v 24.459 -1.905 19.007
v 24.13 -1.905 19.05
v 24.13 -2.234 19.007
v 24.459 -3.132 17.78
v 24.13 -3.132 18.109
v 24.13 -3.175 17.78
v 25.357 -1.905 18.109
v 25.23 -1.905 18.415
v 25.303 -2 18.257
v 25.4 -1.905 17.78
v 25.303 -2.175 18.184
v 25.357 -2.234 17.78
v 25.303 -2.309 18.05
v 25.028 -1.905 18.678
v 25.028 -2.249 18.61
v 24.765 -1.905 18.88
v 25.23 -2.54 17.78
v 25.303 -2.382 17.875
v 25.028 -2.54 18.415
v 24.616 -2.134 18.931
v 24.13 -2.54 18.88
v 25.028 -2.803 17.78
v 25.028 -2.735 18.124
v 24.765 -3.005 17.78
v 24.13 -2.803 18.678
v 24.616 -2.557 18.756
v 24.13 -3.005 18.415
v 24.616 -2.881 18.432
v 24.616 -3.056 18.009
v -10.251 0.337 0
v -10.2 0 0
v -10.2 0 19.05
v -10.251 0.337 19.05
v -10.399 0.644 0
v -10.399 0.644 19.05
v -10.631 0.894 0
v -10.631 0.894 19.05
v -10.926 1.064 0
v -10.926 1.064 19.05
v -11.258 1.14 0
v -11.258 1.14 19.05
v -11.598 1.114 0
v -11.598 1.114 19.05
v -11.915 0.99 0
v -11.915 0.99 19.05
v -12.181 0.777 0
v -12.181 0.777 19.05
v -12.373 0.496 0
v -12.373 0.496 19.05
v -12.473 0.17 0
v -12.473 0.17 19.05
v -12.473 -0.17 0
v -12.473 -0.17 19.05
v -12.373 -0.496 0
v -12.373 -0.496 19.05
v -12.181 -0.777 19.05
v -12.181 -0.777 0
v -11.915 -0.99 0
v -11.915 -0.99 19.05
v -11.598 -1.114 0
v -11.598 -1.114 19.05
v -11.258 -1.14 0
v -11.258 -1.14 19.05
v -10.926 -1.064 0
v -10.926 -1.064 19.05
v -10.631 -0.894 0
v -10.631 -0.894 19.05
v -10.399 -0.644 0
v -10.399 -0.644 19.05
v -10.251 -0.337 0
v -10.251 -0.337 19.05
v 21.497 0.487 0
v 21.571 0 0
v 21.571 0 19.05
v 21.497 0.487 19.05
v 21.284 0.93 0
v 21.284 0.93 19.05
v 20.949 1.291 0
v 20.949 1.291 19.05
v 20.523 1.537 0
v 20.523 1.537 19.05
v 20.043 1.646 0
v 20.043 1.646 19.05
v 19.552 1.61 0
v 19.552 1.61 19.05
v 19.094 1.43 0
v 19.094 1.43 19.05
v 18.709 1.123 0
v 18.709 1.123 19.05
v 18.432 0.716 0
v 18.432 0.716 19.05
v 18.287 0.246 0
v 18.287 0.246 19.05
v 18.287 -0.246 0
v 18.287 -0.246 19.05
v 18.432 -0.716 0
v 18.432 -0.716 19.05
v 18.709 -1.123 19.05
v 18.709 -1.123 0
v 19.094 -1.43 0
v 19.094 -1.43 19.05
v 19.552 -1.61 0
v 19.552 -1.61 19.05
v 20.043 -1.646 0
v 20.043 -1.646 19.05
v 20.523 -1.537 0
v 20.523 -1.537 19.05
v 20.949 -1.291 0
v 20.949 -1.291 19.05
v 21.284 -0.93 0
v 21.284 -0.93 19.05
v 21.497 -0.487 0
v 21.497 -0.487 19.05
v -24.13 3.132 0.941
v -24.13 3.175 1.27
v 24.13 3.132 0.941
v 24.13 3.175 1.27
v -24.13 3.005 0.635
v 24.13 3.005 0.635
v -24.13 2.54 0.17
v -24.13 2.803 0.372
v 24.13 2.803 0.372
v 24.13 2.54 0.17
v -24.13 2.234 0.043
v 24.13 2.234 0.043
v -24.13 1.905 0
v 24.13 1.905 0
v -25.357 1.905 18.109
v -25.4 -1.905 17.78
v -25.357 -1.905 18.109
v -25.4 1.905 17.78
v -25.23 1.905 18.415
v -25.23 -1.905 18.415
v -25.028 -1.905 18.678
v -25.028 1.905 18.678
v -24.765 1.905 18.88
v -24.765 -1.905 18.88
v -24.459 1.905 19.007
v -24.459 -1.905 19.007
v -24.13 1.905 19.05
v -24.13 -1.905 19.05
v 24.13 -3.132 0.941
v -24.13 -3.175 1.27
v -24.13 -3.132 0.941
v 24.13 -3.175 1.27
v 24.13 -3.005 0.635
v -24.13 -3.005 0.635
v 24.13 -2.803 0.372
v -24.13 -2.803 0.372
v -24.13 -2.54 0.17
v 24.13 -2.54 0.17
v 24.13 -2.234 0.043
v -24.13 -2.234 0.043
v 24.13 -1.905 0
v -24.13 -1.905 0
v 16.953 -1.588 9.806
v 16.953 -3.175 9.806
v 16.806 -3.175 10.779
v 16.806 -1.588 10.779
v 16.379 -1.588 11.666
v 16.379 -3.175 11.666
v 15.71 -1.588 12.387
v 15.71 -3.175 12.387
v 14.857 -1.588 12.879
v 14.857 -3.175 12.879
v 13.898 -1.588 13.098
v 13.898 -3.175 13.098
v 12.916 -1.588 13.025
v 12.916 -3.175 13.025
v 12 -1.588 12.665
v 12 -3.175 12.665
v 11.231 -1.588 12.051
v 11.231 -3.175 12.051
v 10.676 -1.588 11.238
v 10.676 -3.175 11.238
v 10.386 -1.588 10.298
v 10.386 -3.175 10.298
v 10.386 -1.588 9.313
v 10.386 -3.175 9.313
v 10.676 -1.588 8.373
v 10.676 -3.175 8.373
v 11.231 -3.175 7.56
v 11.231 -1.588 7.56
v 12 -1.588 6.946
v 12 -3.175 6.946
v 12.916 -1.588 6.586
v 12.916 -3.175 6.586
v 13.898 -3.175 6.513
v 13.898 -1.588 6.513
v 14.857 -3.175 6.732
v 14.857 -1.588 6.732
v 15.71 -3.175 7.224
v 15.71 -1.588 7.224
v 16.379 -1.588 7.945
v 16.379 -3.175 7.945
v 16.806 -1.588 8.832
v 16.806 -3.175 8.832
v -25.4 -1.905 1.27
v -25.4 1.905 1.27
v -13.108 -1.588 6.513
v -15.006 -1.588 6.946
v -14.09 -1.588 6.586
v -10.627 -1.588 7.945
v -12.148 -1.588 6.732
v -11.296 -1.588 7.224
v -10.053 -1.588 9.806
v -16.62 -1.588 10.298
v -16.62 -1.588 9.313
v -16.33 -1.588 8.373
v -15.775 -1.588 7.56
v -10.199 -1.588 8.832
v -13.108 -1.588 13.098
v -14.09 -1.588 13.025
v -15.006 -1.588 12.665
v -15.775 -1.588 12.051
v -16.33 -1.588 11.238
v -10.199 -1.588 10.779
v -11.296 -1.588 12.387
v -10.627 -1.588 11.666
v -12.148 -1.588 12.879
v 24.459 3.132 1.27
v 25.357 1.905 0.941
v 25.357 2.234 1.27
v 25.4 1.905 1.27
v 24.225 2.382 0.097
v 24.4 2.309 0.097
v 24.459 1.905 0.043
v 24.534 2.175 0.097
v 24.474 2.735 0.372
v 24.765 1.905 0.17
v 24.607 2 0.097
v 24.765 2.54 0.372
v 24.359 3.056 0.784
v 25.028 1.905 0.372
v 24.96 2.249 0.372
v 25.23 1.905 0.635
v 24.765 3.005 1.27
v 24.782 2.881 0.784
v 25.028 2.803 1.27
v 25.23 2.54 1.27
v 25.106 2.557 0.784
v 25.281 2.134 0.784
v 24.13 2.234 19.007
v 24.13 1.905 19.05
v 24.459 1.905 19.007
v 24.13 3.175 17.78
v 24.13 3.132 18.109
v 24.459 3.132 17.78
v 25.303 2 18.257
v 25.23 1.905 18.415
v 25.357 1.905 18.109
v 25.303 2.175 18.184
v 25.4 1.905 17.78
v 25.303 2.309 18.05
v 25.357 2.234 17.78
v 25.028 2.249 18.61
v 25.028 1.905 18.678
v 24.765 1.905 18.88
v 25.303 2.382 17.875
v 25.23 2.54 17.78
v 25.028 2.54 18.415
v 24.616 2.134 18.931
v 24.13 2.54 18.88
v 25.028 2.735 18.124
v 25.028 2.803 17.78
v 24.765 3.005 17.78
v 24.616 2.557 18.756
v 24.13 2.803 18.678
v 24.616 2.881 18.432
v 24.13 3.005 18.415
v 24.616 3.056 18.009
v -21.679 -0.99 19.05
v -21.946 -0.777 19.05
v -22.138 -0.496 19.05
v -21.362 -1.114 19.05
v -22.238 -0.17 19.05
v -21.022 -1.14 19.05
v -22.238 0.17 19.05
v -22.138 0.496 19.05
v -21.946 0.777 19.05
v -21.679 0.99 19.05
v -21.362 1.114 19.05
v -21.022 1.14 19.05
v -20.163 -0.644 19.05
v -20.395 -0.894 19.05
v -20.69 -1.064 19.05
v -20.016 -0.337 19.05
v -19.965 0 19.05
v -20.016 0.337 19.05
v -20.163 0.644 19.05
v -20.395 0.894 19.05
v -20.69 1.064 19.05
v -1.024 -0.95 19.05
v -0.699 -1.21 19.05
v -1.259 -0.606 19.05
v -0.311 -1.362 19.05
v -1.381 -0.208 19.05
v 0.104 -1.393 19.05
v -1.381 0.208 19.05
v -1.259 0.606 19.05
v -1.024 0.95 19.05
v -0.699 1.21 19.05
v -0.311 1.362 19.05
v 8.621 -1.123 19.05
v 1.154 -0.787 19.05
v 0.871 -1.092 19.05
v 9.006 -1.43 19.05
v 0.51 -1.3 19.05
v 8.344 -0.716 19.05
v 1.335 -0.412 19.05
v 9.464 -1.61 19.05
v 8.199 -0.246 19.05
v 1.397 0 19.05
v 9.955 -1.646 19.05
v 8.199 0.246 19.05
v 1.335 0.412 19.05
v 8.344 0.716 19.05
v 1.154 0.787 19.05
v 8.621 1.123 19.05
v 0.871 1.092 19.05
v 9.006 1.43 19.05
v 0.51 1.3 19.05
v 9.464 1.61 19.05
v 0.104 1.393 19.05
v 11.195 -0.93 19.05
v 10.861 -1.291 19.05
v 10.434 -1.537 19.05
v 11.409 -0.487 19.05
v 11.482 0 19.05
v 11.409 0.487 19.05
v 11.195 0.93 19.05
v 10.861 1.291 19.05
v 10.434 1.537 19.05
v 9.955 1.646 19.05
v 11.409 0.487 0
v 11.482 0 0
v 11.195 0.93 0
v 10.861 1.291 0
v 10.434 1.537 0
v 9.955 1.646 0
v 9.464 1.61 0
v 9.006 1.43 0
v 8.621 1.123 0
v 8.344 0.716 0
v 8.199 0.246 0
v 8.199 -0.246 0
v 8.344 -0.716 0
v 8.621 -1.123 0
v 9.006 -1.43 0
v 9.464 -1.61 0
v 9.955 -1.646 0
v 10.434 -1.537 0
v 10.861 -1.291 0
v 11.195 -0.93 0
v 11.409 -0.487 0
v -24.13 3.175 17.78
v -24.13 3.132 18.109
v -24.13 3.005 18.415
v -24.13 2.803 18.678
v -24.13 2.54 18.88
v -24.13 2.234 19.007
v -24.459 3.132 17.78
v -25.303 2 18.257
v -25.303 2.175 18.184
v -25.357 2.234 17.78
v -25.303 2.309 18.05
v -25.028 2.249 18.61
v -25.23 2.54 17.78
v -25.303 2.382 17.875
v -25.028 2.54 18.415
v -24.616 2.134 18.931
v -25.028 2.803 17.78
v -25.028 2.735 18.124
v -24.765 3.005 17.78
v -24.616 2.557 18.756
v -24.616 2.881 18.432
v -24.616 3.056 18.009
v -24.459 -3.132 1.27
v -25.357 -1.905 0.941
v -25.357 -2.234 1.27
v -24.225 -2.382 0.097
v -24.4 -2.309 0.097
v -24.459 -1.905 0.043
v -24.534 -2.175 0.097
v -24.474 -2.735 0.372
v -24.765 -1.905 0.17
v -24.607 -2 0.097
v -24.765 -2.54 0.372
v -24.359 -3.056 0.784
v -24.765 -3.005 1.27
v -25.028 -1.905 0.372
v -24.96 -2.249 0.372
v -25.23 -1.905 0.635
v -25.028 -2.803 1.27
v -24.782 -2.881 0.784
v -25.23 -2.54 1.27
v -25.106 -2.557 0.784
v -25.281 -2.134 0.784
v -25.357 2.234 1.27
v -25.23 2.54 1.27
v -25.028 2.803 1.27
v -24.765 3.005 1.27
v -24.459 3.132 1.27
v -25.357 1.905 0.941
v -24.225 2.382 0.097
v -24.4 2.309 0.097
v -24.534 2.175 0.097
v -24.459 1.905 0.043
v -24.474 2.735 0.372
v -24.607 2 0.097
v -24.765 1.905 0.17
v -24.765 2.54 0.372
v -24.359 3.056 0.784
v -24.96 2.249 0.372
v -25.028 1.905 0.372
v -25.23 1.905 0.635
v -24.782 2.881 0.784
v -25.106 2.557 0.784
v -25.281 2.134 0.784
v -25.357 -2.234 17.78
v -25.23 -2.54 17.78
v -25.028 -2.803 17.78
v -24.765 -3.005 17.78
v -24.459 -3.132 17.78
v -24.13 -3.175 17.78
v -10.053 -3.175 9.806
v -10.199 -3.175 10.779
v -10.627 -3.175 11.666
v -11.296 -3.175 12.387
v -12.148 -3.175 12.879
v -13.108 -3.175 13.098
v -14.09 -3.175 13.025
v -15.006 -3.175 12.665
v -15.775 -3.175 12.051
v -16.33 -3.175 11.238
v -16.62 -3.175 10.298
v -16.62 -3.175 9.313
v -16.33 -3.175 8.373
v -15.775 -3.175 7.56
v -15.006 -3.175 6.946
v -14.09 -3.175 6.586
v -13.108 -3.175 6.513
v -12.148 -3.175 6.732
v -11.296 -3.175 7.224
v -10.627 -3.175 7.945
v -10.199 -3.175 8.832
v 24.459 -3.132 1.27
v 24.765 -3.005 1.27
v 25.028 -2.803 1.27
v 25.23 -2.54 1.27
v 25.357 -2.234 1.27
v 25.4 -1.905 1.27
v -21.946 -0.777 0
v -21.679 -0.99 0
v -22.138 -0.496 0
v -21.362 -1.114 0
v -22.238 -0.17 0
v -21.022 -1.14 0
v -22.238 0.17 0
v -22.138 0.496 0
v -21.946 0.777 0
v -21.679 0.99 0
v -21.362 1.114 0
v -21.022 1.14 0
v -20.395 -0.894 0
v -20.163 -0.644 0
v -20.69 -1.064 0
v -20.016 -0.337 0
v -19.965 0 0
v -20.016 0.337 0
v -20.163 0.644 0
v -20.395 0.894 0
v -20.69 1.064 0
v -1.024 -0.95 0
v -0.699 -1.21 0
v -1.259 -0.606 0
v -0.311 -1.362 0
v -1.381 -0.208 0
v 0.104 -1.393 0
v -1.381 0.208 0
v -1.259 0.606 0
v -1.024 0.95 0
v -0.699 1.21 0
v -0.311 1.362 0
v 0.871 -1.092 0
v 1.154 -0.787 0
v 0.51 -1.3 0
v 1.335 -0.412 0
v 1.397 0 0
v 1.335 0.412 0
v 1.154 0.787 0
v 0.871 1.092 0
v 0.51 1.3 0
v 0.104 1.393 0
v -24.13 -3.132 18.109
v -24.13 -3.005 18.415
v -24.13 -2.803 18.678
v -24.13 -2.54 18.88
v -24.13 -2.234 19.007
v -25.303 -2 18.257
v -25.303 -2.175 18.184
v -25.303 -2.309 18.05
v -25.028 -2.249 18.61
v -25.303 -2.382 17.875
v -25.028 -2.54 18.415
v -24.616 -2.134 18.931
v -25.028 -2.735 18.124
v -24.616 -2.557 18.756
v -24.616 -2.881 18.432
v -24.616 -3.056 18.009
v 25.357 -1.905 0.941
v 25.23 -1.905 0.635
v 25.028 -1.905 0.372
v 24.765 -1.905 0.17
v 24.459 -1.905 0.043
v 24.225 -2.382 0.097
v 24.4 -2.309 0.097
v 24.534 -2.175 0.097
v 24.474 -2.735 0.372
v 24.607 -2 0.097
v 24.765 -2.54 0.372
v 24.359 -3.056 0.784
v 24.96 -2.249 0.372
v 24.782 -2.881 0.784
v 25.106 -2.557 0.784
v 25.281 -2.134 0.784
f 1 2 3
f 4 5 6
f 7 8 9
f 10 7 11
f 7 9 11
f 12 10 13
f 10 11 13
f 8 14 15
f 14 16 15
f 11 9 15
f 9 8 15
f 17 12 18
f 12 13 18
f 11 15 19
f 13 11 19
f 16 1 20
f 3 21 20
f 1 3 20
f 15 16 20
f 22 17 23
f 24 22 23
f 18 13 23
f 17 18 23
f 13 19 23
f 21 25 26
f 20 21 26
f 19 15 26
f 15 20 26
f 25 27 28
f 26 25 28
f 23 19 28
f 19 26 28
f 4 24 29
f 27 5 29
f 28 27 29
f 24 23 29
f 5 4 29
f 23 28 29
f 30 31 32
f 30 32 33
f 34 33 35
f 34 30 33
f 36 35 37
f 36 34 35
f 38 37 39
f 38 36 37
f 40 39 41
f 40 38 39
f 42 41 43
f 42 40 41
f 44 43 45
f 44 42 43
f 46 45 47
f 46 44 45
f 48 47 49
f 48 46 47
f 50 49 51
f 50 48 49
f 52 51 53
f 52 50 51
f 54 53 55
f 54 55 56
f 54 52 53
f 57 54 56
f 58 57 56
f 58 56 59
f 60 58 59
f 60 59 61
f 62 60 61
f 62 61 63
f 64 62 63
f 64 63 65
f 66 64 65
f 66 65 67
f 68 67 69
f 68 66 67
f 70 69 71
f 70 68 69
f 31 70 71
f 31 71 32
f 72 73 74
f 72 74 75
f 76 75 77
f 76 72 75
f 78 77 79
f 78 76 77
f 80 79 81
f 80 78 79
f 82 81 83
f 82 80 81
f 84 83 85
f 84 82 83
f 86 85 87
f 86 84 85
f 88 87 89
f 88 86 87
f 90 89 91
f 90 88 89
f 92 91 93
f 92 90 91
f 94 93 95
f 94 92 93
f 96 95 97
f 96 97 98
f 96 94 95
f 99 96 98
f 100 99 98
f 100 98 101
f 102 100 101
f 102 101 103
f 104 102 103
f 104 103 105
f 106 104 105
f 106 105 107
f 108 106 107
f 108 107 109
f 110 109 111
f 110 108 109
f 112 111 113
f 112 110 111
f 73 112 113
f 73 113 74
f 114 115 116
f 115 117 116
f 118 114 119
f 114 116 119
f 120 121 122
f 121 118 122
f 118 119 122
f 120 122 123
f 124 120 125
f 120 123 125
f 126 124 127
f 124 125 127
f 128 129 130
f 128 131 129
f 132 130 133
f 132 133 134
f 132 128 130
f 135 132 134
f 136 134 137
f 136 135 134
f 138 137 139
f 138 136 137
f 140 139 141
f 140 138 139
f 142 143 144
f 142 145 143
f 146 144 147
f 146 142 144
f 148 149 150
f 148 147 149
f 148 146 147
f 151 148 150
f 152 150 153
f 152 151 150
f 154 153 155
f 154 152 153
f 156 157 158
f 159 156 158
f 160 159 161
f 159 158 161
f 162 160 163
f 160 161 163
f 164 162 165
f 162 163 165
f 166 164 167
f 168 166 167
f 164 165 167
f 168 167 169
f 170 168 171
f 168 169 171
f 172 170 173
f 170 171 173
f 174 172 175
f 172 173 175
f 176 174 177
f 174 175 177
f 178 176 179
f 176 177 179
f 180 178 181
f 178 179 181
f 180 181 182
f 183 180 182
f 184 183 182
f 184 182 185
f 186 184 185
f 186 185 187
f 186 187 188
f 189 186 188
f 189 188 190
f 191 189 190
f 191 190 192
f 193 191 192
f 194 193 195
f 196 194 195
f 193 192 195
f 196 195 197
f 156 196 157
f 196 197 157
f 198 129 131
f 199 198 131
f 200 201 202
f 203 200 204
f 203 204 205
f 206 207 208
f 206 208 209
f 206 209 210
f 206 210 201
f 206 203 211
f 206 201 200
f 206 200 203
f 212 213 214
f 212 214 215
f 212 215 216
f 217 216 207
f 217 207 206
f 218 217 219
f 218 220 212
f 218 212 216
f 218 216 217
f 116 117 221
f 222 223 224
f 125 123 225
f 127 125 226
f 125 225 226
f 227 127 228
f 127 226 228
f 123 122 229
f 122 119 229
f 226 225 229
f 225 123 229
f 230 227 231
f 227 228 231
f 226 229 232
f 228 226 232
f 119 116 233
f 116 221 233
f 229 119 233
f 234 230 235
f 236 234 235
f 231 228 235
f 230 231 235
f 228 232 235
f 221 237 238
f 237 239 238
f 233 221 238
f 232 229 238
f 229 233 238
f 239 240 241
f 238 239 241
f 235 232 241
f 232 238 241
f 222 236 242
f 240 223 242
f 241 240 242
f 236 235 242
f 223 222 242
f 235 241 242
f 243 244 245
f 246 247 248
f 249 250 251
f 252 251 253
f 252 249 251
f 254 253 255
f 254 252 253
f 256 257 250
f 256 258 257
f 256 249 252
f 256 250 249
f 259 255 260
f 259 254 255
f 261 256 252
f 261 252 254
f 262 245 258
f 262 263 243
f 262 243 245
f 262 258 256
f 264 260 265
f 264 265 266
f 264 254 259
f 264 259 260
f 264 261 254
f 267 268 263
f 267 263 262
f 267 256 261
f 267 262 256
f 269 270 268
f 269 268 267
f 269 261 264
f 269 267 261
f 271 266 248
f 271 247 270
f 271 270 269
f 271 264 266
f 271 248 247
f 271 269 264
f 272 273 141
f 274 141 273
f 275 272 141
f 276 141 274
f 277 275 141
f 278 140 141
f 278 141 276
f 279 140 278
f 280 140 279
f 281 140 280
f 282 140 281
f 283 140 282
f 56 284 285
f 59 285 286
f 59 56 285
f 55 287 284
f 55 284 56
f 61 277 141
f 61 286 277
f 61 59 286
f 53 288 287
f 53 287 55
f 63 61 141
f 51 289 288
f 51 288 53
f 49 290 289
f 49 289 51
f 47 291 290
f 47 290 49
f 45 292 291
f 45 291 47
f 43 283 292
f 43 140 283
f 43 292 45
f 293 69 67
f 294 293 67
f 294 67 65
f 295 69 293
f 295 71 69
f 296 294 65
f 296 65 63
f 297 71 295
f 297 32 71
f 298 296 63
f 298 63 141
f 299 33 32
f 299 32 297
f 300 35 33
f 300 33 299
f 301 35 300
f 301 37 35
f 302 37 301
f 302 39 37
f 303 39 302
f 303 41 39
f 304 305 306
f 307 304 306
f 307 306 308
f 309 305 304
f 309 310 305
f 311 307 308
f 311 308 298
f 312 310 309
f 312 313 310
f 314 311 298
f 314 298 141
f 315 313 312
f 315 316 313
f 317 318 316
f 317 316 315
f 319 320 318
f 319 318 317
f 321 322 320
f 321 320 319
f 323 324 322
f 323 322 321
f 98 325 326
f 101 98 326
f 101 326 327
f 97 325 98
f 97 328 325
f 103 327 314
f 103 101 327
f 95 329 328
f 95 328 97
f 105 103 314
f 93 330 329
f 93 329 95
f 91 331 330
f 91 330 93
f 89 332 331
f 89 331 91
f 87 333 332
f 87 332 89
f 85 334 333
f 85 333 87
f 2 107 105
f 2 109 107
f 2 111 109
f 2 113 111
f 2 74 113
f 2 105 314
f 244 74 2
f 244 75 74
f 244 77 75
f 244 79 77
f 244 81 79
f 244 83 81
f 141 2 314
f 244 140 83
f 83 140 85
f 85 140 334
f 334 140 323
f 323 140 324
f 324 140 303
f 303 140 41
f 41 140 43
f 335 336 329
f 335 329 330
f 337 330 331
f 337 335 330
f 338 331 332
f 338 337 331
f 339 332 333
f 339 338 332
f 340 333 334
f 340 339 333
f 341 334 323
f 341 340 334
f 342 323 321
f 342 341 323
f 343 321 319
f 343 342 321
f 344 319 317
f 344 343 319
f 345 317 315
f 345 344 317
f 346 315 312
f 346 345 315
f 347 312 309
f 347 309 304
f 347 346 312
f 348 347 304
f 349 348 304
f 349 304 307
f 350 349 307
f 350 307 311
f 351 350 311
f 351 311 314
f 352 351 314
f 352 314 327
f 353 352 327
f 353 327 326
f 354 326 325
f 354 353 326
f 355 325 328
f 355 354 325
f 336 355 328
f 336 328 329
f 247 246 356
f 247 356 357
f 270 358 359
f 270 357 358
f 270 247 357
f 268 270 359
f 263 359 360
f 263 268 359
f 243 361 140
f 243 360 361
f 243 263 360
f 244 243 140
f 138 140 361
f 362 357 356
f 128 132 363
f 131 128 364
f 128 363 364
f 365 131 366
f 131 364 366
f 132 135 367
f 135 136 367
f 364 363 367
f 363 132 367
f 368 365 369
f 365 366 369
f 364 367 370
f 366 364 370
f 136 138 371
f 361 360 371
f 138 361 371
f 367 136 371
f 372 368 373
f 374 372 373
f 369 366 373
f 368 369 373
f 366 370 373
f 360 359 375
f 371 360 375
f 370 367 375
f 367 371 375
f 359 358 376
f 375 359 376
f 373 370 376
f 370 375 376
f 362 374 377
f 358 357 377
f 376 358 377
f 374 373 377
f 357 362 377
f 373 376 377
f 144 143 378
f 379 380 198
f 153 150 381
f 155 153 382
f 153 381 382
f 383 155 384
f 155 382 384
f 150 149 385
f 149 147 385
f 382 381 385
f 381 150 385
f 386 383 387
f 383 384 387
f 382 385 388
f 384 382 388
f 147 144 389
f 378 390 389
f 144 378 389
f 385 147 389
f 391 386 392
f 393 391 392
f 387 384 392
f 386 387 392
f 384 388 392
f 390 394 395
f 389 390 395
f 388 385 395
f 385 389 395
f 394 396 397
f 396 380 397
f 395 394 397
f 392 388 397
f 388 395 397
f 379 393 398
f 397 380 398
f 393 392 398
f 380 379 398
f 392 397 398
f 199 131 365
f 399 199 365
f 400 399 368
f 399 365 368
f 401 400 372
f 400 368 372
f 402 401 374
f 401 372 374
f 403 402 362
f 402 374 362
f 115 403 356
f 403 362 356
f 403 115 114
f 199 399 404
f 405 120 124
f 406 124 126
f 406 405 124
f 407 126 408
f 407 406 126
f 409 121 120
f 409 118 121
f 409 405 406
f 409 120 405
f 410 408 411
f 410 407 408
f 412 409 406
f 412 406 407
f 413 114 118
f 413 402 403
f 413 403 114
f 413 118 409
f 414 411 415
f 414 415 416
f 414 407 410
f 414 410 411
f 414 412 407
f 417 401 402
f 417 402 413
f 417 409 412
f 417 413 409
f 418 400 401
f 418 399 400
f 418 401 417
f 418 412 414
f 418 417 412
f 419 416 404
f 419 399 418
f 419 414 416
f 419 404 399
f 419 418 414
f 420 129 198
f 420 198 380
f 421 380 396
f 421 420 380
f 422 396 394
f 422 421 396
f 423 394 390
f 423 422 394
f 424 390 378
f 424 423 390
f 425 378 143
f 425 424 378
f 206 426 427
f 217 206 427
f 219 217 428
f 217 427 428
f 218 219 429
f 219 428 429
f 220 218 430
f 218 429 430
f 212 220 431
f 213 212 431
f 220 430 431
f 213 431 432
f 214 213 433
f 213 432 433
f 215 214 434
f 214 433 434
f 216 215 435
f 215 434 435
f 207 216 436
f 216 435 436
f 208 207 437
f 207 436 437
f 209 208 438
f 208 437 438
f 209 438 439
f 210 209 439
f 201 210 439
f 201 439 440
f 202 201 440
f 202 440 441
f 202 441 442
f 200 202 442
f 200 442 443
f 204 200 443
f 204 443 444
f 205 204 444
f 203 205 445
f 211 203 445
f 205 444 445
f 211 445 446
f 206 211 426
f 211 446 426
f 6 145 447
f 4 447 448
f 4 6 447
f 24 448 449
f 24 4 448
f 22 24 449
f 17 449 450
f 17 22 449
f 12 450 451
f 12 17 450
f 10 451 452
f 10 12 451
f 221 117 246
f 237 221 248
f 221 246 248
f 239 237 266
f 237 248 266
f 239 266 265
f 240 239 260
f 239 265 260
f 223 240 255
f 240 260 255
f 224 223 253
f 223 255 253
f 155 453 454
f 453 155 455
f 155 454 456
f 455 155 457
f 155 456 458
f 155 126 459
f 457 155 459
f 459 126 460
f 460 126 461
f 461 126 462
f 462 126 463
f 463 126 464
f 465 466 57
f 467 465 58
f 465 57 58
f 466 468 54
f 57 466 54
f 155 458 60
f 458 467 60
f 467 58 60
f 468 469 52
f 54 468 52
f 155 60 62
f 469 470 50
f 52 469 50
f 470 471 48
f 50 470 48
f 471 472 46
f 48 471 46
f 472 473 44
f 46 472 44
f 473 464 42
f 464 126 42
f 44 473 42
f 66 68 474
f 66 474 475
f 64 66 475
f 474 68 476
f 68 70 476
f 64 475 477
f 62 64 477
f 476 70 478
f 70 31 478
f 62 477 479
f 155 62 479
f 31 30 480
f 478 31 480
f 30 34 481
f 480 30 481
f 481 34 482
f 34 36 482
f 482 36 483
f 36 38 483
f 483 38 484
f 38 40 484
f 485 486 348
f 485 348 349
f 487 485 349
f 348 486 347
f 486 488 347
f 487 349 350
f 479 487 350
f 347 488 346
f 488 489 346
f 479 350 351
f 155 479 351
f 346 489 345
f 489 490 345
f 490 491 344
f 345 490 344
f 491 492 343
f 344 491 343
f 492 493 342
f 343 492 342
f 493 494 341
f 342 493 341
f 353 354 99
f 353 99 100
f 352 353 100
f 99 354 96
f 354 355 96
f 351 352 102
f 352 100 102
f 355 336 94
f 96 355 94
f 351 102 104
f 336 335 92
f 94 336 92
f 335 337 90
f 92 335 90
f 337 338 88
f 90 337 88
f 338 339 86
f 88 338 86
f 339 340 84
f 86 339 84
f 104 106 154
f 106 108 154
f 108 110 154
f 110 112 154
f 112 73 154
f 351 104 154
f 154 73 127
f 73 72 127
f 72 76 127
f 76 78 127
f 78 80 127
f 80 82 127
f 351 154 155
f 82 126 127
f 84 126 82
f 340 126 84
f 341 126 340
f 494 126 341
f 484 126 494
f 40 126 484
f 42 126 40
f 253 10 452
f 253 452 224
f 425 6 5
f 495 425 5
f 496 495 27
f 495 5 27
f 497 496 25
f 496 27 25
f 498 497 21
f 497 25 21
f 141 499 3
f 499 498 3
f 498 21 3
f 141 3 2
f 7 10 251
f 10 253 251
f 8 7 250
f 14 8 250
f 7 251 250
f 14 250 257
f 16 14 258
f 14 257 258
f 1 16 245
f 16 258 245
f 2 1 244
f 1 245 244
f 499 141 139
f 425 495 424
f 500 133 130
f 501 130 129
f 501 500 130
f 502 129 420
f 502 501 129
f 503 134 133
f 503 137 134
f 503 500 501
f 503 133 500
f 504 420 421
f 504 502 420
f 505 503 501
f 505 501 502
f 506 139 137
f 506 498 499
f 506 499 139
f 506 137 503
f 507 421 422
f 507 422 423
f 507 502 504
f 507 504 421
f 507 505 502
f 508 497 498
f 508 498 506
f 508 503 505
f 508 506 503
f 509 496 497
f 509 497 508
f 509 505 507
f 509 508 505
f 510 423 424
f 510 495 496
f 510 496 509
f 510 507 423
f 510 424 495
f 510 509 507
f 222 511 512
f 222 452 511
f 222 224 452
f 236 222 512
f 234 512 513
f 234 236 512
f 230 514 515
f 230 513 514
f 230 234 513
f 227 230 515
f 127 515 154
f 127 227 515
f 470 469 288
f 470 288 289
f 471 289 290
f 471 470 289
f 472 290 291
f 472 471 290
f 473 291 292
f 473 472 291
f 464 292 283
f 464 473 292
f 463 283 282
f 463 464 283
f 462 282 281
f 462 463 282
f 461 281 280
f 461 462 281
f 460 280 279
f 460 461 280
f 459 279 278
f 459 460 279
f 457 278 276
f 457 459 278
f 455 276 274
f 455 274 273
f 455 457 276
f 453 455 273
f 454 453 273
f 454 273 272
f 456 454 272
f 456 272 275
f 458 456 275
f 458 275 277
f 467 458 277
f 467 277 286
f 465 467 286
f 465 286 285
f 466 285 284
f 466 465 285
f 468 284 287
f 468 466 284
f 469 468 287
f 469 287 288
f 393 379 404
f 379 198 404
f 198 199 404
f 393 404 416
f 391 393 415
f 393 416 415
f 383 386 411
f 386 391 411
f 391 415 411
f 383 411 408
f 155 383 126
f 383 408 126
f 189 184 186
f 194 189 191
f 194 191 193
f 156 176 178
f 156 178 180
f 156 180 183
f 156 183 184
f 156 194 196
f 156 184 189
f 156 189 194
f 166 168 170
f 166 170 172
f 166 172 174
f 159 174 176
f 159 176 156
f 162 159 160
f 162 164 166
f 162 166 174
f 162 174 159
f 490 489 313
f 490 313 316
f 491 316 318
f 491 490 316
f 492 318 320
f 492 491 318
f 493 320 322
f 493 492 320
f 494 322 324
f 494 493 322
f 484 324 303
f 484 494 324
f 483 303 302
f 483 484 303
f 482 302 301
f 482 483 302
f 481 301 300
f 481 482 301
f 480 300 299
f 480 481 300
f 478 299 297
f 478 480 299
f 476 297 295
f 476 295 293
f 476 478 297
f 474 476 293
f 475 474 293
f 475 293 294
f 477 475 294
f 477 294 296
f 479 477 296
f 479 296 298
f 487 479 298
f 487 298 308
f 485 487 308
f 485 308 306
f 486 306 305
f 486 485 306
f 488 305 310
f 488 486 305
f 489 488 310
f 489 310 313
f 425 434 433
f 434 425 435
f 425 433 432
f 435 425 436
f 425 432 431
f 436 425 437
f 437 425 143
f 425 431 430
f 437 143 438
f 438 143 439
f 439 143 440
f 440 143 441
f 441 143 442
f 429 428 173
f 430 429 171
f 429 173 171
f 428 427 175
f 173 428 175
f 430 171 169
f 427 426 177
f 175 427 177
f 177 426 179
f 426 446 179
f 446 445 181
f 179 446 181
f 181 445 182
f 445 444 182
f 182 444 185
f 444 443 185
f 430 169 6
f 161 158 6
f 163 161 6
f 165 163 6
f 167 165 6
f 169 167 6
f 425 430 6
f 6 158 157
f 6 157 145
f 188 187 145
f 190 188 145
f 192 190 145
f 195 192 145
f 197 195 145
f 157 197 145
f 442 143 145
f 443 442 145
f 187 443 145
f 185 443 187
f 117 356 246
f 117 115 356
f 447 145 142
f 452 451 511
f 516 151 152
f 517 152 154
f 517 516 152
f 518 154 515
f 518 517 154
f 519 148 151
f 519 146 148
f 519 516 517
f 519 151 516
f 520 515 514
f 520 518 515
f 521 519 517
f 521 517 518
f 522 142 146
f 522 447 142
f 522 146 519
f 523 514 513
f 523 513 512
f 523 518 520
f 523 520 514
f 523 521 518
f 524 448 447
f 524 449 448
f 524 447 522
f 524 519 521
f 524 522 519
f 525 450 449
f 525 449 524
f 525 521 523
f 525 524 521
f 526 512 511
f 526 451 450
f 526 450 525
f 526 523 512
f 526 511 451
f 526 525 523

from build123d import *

# Parameters (mm, degrees)
F0_W     = 50.8
F0_H     = 6.35
F0_R     = 1.143
F0_R_2   = 1.397
F0_R_3   = 1.651
F1_DEPTH = 19.05
F2_R     = 1.27
F4_R     = 3.302
F5_DEPTH = 1.5875


with BuildPart() as f1:
    # F0 (on Top) → F1 (new body)
    with BuildSketch(Plane.XY):
        Rectangle(F0_W, F0_H)
        with Locations((-21.107789129, 0)):
            Circle(F0_R, mode=Mode.SUBTRACT)
        with Locations((-11.3432221115, 0)):
            Circle(F0_R, mode=Mode.SUBTRACT)
        Circle(F0_R_2, mode=Mode.SUBTRACT)
        with Locations((9.8313204944, 0)):
            Circle(F0_R_3, mode=Mode.SUBTRACT)
        with Locations((19.9195742607, 0)):
            Circle(F0_R_3, mode=Mode.SUBTRACT)
    extrude(amount=F1_DEPTH)

    # F2
    f2_edges = [f1.edges().sort_by_distance(p)[0] for p in [
        (0, -3.175, 19.05),
        (0, 3.175, 19.05),
        (-25.4, 0, 19.05),
        (25.4, 0, 19.05),
        (-25.4, -3.175, 9.525),
        (-25.4, 3.175, 9.525),
        (25.4, -3.175, 9.525),
        (25.4, 3.175, 9.525),
        (0, -3.175, 0),
        (0, 3.175, 0),
        (25.4, 0, 0),
        (-25.4, 0, 0),
    ]]
    fillet(f2_edges, radius=F2_R)

    # F4 (on offset) → F5 (cut)
    with BuildSketch(Plane.XZ.offset(3.175)):
        with Locations((13.6511175489, 9.8055116832)):
            Circle(F4_R)
        with Locations((-13.3547777533, 9.8055116832)):
            Circle(F4_R)
    extrude(amount=-F5_DEPTH, mode=Mode.SUBTRACT)


solid = f1.part
